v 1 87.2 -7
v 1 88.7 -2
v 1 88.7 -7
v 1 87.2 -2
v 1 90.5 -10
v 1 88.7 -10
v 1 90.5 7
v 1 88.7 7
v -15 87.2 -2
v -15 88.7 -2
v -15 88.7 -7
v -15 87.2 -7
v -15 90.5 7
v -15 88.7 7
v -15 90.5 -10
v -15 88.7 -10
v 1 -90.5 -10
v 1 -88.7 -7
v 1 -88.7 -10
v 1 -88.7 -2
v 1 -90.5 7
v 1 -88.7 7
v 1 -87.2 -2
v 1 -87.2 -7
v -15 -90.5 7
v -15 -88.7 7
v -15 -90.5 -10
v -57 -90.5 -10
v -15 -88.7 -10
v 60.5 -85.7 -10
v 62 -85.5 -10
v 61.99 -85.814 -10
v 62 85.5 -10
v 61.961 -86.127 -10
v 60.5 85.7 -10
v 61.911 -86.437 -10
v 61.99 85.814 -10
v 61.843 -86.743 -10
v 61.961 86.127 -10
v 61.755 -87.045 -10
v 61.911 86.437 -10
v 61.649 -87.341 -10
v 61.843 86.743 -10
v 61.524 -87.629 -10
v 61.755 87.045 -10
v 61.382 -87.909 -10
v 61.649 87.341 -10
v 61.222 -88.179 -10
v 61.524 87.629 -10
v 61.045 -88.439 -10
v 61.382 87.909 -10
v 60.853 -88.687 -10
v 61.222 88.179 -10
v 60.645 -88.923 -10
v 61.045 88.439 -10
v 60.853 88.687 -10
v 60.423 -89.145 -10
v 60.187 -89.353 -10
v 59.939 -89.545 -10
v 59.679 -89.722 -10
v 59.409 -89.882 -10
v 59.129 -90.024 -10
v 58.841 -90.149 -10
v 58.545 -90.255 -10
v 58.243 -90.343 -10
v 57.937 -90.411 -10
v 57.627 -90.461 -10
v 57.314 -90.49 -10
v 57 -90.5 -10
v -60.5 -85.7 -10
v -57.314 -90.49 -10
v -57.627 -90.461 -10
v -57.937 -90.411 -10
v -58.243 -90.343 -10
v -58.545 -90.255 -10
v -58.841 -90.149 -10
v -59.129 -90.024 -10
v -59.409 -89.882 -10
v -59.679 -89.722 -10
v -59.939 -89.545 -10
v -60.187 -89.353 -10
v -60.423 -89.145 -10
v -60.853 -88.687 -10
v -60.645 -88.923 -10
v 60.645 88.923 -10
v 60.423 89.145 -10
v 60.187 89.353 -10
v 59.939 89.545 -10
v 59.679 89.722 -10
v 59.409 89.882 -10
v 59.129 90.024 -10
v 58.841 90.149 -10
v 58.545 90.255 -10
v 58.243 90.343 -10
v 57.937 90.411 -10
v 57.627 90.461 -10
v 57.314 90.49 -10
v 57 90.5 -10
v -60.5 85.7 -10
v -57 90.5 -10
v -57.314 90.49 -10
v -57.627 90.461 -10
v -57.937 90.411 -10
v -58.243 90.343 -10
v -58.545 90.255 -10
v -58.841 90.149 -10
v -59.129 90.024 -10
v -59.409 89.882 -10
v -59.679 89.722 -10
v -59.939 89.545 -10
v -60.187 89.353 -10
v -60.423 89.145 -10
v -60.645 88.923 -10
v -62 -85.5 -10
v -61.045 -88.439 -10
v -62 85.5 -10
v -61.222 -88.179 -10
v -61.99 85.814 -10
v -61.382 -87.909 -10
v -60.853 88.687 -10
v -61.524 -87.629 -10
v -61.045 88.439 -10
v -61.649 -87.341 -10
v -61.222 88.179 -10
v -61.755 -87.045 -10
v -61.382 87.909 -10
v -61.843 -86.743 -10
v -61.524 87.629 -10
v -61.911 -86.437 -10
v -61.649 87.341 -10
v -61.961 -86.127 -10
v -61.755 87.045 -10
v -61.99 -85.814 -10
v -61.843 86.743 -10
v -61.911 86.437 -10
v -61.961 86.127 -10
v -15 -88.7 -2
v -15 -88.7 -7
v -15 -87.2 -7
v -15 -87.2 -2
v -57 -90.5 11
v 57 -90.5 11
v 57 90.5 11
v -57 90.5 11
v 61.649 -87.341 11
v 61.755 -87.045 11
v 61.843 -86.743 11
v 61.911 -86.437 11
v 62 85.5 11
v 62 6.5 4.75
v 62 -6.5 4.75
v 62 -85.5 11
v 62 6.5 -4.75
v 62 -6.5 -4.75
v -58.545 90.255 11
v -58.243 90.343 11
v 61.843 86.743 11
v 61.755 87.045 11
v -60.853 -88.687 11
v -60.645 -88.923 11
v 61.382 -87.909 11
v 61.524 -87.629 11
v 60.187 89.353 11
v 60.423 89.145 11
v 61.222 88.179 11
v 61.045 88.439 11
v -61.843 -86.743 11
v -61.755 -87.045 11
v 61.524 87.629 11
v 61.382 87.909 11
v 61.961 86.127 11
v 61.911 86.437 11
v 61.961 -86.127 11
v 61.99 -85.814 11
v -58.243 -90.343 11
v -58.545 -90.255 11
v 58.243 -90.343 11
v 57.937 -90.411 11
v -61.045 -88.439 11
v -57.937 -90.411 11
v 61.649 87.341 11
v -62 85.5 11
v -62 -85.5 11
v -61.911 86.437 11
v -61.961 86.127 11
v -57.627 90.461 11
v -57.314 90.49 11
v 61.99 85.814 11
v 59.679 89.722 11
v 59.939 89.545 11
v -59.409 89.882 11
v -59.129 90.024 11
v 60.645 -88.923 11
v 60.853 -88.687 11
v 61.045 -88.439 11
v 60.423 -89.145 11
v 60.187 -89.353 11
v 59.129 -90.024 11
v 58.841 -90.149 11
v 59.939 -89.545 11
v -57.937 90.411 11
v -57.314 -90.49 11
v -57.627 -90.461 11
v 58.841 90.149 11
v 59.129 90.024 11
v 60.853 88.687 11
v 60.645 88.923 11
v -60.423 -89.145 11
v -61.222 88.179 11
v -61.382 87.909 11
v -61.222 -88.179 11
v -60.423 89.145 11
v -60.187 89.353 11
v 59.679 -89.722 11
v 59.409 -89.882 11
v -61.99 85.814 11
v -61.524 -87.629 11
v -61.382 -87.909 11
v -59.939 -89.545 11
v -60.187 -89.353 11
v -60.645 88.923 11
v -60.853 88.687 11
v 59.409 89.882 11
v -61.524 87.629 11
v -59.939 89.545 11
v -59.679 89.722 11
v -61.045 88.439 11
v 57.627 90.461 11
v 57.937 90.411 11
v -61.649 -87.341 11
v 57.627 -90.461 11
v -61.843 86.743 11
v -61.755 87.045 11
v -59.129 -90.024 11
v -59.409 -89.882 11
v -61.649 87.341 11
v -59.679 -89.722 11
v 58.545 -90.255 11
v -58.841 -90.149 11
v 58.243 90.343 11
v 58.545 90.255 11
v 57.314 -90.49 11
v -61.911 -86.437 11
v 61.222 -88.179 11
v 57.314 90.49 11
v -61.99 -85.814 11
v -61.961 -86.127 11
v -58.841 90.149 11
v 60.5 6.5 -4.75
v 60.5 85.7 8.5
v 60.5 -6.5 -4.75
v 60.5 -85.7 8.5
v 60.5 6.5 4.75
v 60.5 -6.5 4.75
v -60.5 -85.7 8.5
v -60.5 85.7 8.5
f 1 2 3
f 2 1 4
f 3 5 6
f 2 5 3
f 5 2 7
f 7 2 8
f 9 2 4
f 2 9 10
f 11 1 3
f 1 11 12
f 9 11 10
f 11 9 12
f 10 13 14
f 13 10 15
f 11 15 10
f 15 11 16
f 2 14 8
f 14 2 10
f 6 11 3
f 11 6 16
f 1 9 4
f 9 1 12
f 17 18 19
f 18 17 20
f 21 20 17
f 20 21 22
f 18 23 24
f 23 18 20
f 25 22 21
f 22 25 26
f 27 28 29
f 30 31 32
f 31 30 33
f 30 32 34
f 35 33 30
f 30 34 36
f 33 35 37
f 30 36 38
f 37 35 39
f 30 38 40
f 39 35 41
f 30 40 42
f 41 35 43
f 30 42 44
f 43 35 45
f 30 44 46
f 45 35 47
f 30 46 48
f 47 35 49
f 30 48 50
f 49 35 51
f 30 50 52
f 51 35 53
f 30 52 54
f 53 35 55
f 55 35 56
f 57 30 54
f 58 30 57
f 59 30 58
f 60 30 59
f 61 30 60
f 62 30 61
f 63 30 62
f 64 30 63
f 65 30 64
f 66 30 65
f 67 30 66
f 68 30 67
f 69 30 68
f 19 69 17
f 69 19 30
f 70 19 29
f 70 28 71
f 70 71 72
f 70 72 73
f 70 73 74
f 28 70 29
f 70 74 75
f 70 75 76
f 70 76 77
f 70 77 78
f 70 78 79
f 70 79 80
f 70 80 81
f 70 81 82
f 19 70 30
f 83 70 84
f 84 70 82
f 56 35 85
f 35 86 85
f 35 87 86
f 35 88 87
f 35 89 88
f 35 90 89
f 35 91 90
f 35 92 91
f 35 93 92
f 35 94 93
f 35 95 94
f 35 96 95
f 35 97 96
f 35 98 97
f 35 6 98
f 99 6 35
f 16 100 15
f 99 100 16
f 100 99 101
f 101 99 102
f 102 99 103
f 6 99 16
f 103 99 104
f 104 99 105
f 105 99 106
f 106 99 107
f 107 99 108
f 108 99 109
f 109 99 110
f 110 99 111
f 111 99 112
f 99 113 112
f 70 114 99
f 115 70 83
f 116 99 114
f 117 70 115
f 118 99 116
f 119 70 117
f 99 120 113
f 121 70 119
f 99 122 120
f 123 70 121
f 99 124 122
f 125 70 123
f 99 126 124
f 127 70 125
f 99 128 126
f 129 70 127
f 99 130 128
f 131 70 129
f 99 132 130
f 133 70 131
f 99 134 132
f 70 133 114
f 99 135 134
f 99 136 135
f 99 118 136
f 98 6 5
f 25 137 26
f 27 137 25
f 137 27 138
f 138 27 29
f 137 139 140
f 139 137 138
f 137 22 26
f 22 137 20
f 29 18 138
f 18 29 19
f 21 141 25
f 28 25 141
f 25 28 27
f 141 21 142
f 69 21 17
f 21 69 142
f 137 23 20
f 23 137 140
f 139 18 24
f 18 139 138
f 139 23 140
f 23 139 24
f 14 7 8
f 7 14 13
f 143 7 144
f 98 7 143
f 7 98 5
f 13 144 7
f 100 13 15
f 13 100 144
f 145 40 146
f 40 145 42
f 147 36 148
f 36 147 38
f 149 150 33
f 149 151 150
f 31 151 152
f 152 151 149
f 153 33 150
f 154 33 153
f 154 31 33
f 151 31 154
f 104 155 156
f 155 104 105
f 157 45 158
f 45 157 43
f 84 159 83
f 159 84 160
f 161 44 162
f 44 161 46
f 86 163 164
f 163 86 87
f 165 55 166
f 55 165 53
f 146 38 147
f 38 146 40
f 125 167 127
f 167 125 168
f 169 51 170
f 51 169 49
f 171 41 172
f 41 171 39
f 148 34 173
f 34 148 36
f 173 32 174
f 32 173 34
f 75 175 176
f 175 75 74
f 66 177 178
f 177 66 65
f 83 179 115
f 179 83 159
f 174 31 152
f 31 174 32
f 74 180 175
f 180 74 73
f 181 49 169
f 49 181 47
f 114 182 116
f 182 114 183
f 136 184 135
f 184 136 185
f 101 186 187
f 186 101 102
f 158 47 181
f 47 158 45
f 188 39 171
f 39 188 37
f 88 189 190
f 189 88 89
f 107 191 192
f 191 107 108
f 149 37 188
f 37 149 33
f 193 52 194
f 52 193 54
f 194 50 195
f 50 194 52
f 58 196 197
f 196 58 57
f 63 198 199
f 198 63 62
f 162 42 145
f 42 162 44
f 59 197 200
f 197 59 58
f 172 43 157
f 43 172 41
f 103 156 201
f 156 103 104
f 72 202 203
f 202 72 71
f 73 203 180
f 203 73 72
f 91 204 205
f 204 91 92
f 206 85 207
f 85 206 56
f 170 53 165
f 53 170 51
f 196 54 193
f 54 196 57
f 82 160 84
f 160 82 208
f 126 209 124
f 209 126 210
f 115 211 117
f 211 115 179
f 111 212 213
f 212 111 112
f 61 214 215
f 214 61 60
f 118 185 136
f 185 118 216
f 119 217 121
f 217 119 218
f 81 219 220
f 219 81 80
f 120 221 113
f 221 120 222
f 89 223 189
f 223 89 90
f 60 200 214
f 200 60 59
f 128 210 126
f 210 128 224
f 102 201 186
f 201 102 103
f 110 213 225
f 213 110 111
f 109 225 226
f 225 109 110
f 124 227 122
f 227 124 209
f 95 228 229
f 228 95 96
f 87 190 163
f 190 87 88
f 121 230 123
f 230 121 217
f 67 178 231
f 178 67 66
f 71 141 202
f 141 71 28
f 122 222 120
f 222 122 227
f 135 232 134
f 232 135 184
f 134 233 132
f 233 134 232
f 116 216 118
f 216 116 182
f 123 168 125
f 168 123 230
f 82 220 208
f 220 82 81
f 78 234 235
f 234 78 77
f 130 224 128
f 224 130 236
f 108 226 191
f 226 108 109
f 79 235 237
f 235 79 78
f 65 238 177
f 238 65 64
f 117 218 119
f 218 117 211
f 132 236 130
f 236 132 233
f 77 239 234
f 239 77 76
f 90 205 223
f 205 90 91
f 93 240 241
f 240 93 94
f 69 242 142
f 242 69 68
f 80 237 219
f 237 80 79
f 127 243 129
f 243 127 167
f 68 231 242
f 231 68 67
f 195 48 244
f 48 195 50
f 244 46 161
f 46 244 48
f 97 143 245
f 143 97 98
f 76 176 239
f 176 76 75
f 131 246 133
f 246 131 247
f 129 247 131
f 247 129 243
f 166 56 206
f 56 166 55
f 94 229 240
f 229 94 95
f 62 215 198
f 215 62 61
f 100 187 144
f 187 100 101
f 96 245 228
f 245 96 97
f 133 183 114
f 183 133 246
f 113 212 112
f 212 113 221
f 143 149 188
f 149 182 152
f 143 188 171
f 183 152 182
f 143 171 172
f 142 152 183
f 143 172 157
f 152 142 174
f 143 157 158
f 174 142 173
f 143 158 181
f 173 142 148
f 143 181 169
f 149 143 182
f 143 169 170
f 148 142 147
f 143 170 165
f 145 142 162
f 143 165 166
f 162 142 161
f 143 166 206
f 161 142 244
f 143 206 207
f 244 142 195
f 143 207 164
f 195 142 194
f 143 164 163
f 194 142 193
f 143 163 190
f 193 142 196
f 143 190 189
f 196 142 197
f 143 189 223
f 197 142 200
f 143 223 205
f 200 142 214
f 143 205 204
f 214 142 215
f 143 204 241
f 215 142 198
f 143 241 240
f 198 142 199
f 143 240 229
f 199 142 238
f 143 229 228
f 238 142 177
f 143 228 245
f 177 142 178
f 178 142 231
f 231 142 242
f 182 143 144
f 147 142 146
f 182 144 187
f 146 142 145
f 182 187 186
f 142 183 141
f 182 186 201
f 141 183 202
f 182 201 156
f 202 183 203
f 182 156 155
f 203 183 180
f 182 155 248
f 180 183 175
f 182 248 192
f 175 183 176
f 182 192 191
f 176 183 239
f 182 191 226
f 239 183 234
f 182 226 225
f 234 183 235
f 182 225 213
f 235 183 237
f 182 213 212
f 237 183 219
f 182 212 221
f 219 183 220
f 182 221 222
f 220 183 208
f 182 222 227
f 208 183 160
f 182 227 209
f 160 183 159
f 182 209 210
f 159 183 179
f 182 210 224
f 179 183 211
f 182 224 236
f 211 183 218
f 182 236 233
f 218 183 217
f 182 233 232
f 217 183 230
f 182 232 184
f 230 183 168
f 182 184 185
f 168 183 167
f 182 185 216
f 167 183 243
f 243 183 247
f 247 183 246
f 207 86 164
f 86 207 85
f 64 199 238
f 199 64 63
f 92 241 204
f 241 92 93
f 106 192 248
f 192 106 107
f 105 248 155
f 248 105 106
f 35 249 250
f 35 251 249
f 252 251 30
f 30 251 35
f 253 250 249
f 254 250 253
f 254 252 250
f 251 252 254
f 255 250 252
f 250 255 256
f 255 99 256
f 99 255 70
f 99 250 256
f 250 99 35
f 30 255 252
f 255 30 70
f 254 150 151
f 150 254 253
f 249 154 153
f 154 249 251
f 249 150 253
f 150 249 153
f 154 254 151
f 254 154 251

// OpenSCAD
//Copyright (C) 2022 E.C.O
//Licenced under GPL-2.0-only
//see LICENCE file for more details

$fn=100;

//Change me if you have multiple ONT's
DoYouWant2=false;

//Do not change stuff below this line

//Size of the main ONT box
Length=124;
Width=178+3;
Hight=20; //33
WallThickness=1.5;
Roundness=10;


//Cutout for the clips
ClipX=16;
ClipY=1.8;
ClipZ=17;
Offset=-7;

//Locking feature on the clip
ClipFeatureX=16;
ClipFeatureY=1.5;
ClipFeatureZ=5;
ClipFeatureOffsetZ=3;

//Size of the SC connector change me if you use LC or some other connector
PlugWidth=13;
PlugHight=9.5;


main();

module main() {
  difference() {
    minkowski() {
      cube([Length-Roundness,Width-Roundness,Hight],center=true);
      cylinder(d=Roundness);
    }
    translate([0, 0, -WallThickness/2]) {
      cube([Length-WallThickness*2,Width-2*(ClipFeatureY+ClipY)-2*WallThickness,Hight-WallThickness],center=true);
    }
  translate([Offset, 0, 0]) {
    union(){
      translate([0, -ClipFeatureY/2+Width/2-ClipY, ClipFeatureZ/2-Hight/2+ClipFeatureOffsetZ]) {
        cube([ClipFeatureX,ClipFeatureY,ClipFeatureZ],center=true);
      }
      translate([0, -Width/2+ClipY/2, (ClipZ/2)-Hight/2]) {
        cube([ClipX,ClipY,ClipZ],center=true);
      }
    }
  union(){
    translate([0, ClipFeatureY/2-Width/2+ClipY, ClipFeatureZ/2-Hight/2+ClipFeatureOffsetZ]) {
      cube([ClipFeatureX,ClipFeatureY,ClipFeatureZ],center=true);
    }
    translate([0, Width/2-ClipY/2, (ClipZ/2)-Hight/2]) {
      cube([ClipX,ClipY,ClipZ],center=true);
    }
  }
}

    if(DoYouWant2) {
      translate([Length/2,PlugWidth*2.5, 0]) {
        cube([WallThickness*4,PlugWidth,PlugHight],center=true);
      }
      translate([Length/2,-PlugWidth*2.5, 0]) {
        cube([WallThickness*4,PlugWidth,PlugHight],center=true);
      }
    } else {
      translate([Length/2, 0, 0]) {
        cube([WallThickness*4,PlugWidth,PlugHight],center=true);
      }
    }
  }
}
